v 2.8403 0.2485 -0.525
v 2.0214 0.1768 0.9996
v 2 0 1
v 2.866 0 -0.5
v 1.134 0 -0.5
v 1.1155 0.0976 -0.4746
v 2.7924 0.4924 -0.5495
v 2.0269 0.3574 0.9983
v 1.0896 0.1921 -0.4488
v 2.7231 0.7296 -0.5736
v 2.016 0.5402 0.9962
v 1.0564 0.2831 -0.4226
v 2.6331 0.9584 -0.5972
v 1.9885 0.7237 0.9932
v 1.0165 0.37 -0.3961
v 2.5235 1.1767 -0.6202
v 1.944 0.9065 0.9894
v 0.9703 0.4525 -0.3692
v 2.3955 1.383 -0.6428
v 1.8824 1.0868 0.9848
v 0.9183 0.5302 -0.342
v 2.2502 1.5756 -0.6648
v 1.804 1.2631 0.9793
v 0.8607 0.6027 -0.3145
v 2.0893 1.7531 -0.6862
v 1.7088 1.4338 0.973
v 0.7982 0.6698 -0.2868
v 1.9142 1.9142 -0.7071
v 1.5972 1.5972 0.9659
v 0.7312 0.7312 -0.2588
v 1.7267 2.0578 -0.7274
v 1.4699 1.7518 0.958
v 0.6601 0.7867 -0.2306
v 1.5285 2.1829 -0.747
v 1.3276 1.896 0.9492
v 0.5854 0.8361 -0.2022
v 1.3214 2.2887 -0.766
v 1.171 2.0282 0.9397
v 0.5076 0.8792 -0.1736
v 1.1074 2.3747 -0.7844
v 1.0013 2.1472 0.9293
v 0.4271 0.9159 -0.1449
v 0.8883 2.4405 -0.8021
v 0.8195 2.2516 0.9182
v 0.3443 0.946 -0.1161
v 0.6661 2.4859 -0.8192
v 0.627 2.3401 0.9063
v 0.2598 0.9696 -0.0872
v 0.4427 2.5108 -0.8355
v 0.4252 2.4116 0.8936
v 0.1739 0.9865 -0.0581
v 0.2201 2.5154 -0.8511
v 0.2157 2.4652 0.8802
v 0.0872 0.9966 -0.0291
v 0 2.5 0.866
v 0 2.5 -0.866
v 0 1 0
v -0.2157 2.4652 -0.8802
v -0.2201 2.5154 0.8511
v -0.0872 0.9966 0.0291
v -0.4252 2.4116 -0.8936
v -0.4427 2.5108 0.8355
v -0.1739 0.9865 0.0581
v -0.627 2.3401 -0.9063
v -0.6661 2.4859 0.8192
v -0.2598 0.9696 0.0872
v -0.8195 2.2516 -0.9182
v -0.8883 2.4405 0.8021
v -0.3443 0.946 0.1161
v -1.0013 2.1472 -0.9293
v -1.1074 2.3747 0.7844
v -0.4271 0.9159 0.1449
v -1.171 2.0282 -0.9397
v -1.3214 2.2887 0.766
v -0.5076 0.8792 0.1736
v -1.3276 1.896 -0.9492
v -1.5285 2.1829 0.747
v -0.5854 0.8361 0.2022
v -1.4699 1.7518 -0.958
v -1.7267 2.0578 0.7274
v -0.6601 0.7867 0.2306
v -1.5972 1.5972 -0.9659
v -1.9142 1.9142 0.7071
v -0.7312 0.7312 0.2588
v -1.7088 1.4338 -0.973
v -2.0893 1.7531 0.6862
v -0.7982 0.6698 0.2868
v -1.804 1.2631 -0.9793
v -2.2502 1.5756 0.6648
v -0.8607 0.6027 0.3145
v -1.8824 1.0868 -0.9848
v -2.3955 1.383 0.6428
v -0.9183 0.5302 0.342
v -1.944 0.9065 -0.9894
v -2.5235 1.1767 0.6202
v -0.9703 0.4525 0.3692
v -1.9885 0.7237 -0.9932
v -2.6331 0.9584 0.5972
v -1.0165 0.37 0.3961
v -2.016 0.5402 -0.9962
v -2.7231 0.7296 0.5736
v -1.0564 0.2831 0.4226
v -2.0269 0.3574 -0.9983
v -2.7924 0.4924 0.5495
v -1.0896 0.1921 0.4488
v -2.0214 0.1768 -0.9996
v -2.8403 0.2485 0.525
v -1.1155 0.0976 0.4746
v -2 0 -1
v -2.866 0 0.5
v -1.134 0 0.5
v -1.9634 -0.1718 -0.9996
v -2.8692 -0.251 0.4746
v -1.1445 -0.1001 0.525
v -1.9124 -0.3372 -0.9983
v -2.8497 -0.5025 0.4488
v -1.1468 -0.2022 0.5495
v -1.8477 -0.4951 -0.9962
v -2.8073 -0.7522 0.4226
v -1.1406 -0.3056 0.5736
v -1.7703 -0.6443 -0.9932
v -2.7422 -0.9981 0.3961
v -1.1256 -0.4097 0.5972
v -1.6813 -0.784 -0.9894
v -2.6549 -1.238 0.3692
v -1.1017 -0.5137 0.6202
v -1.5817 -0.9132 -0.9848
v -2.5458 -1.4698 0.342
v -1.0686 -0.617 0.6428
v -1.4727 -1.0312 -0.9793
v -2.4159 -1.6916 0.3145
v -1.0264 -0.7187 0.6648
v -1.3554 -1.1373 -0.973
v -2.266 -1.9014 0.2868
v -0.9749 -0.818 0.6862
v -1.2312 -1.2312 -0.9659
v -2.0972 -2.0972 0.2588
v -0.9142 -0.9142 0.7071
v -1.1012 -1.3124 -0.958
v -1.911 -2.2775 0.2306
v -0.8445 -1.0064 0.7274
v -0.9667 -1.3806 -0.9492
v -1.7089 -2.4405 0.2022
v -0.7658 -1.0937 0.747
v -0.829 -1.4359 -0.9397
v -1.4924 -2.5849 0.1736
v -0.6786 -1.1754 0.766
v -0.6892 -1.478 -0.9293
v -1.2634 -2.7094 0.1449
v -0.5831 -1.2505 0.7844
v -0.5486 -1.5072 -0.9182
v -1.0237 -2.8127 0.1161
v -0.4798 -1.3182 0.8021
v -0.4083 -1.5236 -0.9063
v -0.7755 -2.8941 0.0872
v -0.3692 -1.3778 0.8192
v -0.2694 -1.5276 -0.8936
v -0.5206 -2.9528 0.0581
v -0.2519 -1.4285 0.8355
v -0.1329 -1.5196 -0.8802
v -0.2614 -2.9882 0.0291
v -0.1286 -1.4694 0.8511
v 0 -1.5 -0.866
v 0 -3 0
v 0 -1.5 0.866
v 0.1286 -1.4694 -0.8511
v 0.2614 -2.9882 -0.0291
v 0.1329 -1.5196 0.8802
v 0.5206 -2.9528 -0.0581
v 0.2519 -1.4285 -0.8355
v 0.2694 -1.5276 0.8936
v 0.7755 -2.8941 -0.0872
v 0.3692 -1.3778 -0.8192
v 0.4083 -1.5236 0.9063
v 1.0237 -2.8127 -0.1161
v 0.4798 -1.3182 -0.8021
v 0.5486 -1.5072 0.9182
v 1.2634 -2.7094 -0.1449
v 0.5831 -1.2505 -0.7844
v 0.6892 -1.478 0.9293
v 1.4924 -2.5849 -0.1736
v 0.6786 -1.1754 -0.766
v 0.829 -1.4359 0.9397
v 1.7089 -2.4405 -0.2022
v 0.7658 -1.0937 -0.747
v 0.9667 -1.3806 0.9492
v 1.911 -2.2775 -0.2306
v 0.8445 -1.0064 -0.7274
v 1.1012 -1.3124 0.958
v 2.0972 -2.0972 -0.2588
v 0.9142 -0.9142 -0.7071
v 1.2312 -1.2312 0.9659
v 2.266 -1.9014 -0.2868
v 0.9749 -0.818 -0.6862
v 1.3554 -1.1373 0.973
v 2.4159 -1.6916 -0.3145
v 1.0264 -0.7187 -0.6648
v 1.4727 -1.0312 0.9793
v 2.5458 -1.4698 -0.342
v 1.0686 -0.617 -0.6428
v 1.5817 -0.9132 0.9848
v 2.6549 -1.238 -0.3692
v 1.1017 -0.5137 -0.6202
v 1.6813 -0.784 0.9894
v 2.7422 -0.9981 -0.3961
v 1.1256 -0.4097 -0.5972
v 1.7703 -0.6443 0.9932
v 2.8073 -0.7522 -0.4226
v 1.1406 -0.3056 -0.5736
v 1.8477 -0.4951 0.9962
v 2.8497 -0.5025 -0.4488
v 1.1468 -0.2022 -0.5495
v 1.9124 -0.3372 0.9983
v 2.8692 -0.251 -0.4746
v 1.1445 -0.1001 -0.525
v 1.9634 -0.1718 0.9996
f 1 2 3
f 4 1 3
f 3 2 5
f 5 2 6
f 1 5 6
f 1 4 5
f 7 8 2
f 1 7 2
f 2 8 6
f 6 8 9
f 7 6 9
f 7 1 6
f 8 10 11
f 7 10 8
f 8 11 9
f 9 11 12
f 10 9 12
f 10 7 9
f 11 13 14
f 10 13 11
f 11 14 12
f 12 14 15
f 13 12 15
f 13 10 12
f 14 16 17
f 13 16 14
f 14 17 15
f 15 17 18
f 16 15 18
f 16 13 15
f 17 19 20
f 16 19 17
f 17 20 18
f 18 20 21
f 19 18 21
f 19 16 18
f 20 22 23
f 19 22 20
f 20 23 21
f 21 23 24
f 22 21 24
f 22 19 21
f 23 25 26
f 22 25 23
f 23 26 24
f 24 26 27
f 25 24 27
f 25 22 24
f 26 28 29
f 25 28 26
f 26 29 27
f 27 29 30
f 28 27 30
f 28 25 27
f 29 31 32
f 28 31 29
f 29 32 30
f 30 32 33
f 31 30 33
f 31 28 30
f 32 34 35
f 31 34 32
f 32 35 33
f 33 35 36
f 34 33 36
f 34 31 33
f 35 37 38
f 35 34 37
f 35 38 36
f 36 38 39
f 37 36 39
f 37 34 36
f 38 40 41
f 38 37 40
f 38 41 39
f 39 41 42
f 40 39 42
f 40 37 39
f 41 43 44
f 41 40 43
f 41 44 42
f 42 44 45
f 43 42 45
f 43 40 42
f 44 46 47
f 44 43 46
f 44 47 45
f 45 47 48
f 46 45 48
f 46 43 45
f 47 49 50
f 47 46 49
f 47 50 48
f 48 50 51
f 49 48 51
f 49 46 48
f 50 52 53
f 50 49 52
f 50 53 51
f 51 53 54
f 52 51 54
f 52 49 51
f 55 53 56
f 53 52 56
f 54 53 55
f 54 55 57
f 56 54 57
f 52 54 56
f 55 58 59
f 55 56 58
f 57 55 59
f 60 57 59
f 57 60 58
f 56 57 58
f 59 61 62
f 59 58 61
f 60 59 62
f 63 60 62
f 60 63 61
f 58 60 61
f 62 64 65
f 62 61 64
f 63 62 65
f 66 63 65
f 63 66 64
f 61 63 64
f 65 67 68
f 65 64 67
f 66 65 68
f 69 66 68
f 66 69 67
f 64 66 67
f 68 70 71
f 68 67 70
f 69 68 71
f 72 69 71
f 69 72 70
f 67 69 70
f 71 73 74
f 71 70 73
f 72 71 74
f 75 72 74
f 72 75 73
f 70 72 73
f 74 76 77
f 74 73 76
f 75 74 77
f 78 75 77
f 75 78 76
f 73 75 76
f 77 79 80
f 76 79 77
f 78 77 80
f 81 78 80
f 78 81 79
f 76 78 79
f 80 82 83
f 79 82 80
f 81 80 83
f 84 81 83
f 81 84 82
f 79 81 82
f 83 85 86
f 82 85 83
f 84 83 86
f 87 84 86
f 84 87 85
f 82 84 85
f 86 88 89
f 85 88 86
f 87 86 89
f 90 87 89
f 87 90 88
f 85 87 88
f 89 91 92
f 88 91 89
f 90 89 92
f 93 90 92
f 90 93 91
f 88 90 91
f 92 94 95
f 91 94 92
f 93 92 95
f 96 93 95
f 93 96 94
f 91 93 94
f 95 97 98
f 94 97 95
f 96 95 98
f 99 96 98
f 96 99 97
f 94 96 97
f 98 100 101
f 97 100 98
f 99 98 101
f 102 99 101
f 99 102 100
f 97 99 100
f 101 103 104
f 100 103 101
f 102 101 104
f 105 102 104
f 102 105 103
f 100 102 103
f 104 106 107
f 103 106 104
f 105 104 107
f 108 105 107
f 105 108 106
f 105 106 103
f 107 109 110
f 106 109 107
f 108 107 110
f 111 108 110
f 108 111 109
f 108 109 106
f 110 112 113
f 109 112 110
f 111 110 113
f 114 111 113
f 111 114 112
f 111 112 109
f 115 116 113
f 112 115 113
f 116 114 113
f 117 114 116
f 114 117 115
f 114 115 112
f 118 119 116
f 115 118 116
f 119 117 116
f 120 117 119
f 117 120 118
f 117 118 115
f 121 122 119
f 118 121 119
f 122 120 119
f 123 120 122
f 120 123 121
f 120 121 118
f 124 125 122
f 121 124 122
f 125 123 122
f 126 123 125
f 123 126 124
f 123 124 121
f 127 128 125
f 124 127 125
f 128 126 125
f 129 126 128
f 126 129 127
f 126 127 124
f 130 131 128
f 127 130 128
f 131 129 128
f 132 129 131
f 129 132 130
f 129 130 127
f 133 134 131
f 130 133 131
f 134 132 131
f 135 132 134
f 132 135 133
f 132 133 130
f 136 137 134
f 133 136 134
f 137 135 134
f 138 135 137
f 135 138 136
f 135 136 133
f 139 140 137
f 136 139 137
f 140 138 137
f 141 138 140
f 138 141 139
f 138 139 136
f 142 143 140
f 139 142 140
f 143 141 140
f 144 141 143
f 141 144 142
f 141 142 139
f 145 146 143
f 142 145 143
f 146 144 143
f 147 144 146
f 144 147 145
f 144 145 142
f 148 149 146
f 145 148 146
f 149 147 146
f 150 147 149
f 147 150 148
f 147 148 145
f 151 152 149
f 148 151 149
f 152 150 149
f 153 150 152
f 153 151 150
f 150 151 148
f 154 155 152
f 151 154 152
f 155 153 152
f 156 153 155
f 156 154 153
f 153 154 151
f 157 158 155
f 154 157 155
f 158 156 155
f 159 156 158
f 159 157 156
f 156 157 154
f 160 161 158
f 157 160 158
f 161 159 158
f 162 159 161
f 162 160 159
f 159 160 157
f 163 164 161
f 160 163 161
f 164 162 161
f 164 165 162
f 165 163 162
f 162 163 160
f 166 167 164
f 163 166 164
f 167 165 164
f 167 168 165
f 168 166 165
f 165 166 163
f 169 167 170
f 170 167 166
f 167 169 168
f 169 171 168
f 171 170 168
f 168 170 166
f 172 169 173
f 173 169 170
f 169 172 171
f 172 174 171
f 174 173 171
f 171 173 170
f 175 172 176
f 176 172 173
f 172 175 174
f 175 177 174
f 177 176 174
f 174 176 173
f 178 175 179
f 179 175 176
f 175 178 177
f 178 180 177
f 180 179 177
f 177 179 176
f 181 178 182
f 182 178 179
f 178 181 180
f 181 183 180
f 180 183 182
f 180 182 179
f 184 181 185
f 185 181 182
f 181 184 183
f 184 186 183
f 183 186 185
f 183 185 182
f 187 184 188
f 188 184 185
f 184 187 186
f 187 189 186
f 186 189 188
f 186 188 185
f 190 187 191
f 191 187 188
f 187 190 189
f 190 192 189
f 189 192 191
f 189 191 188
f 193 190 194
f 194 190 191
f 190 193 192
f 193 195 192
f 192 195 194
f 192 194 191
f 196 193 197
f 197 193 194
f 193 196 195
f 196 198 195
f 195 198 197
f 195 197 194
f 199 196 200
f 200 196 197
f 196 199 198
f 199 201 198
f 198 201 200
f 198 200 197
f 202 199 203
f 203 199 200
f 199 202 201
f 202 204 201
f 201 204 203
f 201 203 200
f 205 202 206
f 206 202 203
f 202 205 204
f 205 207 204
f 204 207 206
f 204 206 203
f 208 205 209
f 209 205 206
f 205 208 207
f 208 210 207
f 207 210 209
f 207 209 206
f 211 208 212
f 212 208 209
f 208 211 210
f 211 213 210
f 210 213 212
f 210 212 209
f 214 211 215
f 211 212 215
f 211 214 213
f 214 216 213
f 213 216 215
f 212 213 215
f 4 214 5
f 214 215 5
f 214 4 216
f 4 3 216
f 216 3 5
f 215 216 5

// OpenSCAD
// Umbilical Torus generator, by Bruce Mueller 2013/03/30 CC-BY-SA
// inc = incremental segments

inc=5;
// r = radius of circle
// t = 'radius' of triangle -distance from center to vertex
// a = angle of rotation of triangle
// b = angle rotation around center of circle

function tri(r,t,a,b) = [(r + t*sin(a))*cos(b), (r+ t*sin(a))*sin(b), t*cos(a)];

// module to generate a rotated triangle slice, inc degrees wide
// (could not implement this in the for loop below)

module wedge(r,t,i,inc) {
	a1 = tri(r,t,i/3,i);
	b1 = tri(r,t,120+i/3,i);
	c1 = tri(r,t,240+i/3,i);
	j=i+inc;
	a2 = tri(r,t,j/3,j);
	b2 = tri(r,t,120+j/3,j);
	c2 = tri(r,t,240+j/3,j);
	
	polyhedron(
		points=[a1,b1,c1,a2,b2,c2],
		triangles=[ [0,1,2], [5,4,3], 
			[3,4,0], [1,0,4],
			[3,0,2], [3,2,5],
			[5,2,4], [4,2,1] ] );
}


// created a conjoined set of triangular wedges around the circle

for (i=[0:inc:360-inc]) {
wedge(2,1,i,inc);
}
